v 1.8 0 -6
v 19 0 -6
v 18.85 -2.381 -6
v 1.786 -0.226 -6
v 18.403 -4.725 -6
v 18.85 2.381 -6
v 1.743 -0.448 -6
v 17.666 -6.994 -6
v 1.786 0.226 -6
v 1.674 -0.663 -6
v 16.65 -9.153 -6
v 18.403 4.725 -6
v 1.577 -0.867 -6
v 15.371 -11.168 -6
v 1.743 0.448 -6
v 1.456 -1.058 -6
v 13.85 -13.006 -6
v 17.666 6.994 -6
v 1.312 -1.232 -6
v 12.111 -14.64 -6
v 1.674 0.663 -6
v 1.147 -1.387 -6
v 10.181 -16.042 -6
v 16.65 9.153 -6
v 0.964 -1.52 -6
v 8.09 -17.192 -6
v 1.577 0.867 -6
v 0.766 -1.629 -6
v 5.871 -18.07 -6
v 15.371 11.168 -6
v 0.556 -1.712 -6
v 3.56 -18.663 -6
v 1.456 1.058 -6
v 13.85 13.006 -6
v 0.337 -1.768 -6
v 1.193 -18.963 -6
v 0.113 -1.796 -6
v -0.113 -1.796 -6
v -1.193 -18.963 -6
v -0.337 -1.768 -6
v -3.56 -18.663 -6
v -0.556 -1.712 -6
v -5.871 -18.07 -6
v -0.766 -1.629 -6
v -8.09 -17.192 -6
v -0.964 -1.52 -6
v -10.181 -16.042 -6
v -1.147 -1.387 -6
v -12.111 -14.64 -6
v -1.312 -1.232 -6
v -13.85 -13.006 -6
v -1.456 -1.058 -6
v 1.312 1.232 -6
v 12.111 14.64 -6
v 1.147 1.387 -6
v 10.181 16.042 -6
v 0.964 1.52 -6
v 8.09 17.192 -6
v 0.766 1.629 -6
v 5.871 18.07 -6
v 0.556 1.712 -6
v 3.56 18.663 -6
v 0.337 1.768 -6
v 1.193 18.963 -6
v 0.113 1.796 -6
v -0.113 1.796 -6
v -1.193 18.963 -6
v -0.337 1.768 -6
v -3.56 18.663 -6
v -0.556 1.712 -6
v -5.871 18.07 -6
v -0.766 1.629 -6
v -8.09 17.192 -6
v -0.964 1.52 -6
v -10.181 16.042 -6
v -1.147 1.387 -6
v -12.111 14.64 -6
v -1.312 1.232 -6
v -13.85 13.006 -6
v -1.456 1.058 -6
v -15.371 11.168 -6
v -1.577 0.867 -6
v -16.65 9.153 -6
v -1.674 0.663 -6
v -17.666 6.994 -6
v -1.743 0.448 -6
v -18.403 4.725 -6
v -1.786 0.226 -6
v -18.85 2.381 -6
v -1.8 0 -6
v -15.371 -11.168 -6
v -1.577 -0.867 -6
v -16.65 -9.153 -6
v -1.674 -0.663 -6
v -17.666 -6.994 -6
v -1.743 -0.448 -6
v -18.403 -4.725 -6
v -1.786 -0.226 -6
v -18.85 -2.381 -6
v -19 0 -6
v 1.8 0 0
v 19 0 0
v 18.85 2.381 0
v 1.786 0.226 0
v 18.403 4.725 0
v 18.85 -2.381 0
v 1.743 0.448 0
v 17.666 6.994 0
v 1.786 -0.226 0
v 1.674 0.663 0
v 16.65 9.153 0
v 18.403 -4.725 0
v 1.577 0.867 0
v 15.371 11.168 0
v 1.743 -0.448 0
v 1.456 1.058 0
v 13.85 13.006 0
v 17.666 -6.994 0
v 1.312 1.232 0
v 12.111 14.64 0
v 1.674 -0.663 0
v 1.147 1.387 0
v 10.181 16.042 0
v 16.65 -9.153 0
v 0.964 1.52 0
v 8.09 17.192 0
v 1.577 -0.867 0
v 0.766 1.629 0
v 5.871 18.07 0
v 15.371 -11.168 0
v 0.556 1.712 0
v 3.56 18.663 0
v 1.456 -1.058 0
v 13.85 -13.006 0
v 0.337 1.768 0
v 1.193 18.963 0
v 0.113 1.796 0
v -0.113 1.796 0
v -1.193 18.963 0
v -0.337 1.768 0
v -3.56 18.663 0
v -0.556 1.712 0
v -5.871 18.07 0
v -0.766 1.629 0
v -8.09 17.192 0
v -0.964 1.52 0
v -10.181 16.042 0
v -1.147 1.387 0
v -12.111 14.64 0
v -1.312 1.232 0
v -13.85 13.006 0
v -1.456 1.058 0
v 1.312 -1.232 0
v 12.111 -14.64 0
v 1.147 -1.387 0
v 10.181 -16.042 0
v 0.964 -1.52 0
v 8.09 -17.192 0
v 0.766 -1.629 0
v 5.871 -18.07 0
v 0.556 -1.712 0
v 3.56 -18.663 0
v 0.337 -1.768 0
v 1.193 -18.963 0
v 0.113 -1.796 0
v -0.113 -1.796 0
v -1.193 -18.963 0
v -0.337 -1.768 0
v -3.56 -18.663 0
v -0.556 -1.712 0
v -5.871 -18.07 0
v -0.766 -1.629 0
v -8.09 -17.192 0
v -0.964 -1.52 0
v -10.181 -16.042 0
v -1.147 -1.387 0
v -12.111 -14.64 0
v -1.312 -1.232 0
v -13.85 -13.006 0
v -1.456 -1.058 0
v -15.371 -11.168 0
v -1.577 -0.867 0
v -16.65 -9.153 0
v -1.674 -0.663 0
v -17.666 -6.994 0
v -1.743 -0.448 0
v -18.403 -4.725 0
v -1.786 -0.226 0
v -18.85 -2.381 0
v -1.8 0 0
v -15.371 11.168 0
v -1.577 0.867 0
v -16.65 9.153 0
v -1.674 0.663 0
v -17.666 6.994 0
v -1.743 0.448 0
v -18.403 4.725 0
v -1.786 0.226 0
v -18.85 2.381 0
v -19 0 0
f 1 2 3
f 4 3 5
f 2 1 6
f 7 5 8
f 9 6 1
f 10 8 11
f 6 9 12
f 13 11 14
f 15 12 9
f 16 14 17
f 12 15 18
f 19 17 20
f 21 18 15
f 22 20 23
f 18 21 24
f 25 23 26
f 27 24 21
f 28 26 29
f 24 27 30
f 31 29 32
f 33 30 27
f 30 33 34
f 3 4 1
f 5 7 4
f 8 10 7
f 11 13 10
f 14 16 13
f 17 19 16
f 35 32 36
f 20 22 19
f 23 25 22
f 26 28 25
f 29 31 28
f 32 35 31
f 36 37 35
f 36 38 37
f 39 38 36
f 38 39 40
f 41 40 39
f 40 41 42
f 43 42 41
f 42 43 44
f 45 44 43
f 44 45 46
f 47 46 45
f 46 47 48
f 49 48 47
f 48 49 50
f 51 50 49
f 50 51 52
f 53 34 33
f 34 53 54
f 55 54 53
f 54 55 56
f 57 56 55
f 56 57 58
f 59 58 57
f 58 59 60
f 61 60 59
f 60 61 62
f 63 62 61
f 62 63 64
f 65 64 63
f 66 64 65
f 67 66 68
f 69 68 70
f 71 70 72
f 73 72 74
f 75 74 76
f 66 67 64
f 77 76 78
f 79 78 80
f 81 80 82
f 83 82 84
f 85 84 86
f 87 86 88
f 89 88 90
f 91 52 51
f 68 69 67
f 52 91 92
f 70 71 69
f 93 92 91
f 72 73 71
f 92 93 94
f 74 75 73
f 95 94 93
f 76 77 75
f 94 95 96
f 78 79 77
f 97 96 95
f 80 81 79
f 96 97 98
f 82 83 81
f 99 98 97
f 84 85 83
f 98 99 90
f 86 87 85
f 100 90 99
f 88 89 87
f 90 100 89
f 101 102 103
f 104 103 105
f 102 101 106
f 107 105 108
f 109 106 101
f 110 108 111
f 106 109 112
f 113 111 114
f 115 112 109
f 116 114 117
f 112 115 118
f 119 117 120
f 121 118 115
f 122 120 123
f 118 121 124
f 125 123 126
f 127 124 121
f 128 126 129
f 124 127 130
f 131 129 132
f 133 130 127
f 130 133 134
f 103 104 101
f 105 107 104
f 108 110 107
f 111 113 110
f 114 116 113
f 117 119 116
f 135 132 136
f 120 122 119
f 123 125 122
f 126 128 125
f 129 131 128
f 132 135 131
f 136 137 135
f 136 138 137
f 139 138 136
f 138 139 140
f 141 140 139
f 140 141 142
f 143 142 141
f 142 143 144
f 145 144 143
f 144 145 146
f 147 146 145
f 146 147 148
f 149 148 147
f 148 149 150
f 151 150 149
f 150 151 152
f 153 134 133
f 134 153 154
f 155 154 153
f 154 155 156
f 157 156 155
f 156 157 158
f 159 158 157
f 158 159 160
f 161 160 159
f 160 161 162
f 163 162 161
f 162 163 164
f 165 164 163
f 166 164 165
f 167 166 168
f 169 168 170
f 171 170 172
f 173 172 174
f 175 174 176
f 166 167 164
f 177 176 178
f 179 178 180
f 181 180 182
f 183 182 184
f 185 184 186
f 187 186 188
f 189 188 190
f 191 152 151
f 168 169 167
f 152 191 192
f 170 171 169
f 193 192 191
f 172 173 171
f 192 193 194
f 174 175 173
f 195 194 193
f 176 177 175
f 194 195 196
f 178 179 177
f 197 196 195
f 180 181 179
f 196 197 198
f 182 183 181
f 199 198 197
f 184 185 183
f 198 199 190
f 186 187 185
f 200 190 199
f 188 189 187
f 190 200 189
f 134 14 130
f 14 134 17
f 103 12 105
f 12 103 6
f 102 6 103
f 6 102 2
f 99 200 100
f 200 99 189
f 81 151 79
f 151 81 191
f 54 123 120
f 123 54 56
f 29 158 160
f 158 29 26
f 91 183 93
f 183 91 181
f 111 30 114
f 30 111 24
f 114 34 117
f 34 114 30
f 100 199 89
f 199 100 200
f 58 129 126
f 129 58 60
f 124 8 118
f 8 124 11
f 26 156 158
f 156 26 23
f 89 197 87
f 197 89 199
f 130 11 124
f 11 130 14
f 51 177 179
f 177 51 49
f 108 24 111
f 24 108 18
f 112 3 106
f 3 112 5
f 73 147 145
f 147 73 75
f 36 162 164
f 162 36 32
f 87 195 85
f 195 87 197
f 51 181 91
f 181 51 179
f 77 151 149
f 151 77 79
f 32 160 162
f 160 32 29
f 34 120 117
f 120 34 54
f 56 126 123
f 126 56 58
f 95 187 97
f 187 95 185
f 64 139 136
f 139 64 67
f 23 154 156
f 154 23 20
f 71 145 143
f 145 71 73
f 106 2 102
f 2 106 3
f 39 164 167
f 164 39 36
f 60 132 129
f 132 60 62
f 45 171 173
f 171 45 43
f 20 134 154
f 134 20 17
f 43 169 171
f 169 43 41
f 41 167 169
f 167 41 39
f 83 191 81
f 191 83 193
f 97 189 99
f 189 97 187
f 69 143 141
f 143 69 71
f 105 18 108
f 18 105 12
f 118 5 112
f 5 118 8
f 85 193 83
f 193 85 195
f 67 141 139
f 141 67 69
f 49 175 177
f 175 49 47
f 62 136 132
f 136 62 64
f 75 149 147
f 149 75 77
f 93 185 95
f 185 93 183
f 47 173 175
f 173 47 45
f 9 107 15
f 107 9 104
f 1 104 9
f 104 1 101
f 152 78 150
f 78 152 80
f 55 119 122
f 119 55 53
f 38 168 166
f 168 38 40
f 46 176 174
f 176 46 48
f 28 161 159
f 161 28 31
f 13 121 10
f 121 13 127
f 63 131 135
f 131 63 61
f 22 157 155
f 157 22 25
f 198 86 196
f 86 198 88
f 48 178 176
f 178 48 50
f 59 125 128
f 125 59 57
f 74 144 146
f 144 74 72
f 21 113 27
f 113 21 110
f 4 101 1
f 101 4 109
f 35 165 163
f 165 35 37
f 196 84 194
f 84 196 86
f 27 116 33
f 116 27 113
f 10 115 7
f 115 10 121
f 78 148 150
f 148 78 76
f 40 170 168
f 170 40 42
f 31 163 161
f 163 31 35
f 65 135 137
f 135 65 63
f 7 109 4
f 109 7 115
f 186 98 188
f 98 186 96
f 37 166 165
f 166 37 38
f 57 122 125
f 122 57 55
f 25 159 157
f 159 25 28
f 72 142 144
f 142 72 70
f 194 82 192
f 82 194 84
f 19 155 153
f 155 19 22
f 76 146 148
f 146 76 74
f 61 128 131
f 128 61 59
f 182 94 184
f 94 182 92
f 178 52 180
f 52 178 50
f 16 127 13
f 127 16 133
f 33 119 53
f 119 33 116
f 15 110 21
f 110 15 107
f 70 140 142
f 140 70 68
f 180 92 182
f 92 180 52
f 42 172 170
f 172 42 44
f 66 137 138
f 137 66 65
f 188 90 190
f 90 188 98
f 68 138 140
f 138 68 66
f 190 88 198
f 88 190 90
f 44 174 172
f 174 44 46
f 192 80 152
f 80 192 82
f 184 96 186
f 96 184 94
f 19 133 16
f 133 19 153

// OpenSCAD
$fn = 50;


difference() {
	union() {
		translate(v = [0, 0, -6.0000000000]) {
			cylinder(h = 6, r = 10.0000000000);
		}
		translate(v = [0, 0, -6.0000000000]) {
			cylinder(h = 6, r = 19.0000000000);
		}
	}
	union() {
		#translate(v = [0, 0, -6]) {
			cylinder(h = 6, r = 1.8000000000);
		}
	}
}
